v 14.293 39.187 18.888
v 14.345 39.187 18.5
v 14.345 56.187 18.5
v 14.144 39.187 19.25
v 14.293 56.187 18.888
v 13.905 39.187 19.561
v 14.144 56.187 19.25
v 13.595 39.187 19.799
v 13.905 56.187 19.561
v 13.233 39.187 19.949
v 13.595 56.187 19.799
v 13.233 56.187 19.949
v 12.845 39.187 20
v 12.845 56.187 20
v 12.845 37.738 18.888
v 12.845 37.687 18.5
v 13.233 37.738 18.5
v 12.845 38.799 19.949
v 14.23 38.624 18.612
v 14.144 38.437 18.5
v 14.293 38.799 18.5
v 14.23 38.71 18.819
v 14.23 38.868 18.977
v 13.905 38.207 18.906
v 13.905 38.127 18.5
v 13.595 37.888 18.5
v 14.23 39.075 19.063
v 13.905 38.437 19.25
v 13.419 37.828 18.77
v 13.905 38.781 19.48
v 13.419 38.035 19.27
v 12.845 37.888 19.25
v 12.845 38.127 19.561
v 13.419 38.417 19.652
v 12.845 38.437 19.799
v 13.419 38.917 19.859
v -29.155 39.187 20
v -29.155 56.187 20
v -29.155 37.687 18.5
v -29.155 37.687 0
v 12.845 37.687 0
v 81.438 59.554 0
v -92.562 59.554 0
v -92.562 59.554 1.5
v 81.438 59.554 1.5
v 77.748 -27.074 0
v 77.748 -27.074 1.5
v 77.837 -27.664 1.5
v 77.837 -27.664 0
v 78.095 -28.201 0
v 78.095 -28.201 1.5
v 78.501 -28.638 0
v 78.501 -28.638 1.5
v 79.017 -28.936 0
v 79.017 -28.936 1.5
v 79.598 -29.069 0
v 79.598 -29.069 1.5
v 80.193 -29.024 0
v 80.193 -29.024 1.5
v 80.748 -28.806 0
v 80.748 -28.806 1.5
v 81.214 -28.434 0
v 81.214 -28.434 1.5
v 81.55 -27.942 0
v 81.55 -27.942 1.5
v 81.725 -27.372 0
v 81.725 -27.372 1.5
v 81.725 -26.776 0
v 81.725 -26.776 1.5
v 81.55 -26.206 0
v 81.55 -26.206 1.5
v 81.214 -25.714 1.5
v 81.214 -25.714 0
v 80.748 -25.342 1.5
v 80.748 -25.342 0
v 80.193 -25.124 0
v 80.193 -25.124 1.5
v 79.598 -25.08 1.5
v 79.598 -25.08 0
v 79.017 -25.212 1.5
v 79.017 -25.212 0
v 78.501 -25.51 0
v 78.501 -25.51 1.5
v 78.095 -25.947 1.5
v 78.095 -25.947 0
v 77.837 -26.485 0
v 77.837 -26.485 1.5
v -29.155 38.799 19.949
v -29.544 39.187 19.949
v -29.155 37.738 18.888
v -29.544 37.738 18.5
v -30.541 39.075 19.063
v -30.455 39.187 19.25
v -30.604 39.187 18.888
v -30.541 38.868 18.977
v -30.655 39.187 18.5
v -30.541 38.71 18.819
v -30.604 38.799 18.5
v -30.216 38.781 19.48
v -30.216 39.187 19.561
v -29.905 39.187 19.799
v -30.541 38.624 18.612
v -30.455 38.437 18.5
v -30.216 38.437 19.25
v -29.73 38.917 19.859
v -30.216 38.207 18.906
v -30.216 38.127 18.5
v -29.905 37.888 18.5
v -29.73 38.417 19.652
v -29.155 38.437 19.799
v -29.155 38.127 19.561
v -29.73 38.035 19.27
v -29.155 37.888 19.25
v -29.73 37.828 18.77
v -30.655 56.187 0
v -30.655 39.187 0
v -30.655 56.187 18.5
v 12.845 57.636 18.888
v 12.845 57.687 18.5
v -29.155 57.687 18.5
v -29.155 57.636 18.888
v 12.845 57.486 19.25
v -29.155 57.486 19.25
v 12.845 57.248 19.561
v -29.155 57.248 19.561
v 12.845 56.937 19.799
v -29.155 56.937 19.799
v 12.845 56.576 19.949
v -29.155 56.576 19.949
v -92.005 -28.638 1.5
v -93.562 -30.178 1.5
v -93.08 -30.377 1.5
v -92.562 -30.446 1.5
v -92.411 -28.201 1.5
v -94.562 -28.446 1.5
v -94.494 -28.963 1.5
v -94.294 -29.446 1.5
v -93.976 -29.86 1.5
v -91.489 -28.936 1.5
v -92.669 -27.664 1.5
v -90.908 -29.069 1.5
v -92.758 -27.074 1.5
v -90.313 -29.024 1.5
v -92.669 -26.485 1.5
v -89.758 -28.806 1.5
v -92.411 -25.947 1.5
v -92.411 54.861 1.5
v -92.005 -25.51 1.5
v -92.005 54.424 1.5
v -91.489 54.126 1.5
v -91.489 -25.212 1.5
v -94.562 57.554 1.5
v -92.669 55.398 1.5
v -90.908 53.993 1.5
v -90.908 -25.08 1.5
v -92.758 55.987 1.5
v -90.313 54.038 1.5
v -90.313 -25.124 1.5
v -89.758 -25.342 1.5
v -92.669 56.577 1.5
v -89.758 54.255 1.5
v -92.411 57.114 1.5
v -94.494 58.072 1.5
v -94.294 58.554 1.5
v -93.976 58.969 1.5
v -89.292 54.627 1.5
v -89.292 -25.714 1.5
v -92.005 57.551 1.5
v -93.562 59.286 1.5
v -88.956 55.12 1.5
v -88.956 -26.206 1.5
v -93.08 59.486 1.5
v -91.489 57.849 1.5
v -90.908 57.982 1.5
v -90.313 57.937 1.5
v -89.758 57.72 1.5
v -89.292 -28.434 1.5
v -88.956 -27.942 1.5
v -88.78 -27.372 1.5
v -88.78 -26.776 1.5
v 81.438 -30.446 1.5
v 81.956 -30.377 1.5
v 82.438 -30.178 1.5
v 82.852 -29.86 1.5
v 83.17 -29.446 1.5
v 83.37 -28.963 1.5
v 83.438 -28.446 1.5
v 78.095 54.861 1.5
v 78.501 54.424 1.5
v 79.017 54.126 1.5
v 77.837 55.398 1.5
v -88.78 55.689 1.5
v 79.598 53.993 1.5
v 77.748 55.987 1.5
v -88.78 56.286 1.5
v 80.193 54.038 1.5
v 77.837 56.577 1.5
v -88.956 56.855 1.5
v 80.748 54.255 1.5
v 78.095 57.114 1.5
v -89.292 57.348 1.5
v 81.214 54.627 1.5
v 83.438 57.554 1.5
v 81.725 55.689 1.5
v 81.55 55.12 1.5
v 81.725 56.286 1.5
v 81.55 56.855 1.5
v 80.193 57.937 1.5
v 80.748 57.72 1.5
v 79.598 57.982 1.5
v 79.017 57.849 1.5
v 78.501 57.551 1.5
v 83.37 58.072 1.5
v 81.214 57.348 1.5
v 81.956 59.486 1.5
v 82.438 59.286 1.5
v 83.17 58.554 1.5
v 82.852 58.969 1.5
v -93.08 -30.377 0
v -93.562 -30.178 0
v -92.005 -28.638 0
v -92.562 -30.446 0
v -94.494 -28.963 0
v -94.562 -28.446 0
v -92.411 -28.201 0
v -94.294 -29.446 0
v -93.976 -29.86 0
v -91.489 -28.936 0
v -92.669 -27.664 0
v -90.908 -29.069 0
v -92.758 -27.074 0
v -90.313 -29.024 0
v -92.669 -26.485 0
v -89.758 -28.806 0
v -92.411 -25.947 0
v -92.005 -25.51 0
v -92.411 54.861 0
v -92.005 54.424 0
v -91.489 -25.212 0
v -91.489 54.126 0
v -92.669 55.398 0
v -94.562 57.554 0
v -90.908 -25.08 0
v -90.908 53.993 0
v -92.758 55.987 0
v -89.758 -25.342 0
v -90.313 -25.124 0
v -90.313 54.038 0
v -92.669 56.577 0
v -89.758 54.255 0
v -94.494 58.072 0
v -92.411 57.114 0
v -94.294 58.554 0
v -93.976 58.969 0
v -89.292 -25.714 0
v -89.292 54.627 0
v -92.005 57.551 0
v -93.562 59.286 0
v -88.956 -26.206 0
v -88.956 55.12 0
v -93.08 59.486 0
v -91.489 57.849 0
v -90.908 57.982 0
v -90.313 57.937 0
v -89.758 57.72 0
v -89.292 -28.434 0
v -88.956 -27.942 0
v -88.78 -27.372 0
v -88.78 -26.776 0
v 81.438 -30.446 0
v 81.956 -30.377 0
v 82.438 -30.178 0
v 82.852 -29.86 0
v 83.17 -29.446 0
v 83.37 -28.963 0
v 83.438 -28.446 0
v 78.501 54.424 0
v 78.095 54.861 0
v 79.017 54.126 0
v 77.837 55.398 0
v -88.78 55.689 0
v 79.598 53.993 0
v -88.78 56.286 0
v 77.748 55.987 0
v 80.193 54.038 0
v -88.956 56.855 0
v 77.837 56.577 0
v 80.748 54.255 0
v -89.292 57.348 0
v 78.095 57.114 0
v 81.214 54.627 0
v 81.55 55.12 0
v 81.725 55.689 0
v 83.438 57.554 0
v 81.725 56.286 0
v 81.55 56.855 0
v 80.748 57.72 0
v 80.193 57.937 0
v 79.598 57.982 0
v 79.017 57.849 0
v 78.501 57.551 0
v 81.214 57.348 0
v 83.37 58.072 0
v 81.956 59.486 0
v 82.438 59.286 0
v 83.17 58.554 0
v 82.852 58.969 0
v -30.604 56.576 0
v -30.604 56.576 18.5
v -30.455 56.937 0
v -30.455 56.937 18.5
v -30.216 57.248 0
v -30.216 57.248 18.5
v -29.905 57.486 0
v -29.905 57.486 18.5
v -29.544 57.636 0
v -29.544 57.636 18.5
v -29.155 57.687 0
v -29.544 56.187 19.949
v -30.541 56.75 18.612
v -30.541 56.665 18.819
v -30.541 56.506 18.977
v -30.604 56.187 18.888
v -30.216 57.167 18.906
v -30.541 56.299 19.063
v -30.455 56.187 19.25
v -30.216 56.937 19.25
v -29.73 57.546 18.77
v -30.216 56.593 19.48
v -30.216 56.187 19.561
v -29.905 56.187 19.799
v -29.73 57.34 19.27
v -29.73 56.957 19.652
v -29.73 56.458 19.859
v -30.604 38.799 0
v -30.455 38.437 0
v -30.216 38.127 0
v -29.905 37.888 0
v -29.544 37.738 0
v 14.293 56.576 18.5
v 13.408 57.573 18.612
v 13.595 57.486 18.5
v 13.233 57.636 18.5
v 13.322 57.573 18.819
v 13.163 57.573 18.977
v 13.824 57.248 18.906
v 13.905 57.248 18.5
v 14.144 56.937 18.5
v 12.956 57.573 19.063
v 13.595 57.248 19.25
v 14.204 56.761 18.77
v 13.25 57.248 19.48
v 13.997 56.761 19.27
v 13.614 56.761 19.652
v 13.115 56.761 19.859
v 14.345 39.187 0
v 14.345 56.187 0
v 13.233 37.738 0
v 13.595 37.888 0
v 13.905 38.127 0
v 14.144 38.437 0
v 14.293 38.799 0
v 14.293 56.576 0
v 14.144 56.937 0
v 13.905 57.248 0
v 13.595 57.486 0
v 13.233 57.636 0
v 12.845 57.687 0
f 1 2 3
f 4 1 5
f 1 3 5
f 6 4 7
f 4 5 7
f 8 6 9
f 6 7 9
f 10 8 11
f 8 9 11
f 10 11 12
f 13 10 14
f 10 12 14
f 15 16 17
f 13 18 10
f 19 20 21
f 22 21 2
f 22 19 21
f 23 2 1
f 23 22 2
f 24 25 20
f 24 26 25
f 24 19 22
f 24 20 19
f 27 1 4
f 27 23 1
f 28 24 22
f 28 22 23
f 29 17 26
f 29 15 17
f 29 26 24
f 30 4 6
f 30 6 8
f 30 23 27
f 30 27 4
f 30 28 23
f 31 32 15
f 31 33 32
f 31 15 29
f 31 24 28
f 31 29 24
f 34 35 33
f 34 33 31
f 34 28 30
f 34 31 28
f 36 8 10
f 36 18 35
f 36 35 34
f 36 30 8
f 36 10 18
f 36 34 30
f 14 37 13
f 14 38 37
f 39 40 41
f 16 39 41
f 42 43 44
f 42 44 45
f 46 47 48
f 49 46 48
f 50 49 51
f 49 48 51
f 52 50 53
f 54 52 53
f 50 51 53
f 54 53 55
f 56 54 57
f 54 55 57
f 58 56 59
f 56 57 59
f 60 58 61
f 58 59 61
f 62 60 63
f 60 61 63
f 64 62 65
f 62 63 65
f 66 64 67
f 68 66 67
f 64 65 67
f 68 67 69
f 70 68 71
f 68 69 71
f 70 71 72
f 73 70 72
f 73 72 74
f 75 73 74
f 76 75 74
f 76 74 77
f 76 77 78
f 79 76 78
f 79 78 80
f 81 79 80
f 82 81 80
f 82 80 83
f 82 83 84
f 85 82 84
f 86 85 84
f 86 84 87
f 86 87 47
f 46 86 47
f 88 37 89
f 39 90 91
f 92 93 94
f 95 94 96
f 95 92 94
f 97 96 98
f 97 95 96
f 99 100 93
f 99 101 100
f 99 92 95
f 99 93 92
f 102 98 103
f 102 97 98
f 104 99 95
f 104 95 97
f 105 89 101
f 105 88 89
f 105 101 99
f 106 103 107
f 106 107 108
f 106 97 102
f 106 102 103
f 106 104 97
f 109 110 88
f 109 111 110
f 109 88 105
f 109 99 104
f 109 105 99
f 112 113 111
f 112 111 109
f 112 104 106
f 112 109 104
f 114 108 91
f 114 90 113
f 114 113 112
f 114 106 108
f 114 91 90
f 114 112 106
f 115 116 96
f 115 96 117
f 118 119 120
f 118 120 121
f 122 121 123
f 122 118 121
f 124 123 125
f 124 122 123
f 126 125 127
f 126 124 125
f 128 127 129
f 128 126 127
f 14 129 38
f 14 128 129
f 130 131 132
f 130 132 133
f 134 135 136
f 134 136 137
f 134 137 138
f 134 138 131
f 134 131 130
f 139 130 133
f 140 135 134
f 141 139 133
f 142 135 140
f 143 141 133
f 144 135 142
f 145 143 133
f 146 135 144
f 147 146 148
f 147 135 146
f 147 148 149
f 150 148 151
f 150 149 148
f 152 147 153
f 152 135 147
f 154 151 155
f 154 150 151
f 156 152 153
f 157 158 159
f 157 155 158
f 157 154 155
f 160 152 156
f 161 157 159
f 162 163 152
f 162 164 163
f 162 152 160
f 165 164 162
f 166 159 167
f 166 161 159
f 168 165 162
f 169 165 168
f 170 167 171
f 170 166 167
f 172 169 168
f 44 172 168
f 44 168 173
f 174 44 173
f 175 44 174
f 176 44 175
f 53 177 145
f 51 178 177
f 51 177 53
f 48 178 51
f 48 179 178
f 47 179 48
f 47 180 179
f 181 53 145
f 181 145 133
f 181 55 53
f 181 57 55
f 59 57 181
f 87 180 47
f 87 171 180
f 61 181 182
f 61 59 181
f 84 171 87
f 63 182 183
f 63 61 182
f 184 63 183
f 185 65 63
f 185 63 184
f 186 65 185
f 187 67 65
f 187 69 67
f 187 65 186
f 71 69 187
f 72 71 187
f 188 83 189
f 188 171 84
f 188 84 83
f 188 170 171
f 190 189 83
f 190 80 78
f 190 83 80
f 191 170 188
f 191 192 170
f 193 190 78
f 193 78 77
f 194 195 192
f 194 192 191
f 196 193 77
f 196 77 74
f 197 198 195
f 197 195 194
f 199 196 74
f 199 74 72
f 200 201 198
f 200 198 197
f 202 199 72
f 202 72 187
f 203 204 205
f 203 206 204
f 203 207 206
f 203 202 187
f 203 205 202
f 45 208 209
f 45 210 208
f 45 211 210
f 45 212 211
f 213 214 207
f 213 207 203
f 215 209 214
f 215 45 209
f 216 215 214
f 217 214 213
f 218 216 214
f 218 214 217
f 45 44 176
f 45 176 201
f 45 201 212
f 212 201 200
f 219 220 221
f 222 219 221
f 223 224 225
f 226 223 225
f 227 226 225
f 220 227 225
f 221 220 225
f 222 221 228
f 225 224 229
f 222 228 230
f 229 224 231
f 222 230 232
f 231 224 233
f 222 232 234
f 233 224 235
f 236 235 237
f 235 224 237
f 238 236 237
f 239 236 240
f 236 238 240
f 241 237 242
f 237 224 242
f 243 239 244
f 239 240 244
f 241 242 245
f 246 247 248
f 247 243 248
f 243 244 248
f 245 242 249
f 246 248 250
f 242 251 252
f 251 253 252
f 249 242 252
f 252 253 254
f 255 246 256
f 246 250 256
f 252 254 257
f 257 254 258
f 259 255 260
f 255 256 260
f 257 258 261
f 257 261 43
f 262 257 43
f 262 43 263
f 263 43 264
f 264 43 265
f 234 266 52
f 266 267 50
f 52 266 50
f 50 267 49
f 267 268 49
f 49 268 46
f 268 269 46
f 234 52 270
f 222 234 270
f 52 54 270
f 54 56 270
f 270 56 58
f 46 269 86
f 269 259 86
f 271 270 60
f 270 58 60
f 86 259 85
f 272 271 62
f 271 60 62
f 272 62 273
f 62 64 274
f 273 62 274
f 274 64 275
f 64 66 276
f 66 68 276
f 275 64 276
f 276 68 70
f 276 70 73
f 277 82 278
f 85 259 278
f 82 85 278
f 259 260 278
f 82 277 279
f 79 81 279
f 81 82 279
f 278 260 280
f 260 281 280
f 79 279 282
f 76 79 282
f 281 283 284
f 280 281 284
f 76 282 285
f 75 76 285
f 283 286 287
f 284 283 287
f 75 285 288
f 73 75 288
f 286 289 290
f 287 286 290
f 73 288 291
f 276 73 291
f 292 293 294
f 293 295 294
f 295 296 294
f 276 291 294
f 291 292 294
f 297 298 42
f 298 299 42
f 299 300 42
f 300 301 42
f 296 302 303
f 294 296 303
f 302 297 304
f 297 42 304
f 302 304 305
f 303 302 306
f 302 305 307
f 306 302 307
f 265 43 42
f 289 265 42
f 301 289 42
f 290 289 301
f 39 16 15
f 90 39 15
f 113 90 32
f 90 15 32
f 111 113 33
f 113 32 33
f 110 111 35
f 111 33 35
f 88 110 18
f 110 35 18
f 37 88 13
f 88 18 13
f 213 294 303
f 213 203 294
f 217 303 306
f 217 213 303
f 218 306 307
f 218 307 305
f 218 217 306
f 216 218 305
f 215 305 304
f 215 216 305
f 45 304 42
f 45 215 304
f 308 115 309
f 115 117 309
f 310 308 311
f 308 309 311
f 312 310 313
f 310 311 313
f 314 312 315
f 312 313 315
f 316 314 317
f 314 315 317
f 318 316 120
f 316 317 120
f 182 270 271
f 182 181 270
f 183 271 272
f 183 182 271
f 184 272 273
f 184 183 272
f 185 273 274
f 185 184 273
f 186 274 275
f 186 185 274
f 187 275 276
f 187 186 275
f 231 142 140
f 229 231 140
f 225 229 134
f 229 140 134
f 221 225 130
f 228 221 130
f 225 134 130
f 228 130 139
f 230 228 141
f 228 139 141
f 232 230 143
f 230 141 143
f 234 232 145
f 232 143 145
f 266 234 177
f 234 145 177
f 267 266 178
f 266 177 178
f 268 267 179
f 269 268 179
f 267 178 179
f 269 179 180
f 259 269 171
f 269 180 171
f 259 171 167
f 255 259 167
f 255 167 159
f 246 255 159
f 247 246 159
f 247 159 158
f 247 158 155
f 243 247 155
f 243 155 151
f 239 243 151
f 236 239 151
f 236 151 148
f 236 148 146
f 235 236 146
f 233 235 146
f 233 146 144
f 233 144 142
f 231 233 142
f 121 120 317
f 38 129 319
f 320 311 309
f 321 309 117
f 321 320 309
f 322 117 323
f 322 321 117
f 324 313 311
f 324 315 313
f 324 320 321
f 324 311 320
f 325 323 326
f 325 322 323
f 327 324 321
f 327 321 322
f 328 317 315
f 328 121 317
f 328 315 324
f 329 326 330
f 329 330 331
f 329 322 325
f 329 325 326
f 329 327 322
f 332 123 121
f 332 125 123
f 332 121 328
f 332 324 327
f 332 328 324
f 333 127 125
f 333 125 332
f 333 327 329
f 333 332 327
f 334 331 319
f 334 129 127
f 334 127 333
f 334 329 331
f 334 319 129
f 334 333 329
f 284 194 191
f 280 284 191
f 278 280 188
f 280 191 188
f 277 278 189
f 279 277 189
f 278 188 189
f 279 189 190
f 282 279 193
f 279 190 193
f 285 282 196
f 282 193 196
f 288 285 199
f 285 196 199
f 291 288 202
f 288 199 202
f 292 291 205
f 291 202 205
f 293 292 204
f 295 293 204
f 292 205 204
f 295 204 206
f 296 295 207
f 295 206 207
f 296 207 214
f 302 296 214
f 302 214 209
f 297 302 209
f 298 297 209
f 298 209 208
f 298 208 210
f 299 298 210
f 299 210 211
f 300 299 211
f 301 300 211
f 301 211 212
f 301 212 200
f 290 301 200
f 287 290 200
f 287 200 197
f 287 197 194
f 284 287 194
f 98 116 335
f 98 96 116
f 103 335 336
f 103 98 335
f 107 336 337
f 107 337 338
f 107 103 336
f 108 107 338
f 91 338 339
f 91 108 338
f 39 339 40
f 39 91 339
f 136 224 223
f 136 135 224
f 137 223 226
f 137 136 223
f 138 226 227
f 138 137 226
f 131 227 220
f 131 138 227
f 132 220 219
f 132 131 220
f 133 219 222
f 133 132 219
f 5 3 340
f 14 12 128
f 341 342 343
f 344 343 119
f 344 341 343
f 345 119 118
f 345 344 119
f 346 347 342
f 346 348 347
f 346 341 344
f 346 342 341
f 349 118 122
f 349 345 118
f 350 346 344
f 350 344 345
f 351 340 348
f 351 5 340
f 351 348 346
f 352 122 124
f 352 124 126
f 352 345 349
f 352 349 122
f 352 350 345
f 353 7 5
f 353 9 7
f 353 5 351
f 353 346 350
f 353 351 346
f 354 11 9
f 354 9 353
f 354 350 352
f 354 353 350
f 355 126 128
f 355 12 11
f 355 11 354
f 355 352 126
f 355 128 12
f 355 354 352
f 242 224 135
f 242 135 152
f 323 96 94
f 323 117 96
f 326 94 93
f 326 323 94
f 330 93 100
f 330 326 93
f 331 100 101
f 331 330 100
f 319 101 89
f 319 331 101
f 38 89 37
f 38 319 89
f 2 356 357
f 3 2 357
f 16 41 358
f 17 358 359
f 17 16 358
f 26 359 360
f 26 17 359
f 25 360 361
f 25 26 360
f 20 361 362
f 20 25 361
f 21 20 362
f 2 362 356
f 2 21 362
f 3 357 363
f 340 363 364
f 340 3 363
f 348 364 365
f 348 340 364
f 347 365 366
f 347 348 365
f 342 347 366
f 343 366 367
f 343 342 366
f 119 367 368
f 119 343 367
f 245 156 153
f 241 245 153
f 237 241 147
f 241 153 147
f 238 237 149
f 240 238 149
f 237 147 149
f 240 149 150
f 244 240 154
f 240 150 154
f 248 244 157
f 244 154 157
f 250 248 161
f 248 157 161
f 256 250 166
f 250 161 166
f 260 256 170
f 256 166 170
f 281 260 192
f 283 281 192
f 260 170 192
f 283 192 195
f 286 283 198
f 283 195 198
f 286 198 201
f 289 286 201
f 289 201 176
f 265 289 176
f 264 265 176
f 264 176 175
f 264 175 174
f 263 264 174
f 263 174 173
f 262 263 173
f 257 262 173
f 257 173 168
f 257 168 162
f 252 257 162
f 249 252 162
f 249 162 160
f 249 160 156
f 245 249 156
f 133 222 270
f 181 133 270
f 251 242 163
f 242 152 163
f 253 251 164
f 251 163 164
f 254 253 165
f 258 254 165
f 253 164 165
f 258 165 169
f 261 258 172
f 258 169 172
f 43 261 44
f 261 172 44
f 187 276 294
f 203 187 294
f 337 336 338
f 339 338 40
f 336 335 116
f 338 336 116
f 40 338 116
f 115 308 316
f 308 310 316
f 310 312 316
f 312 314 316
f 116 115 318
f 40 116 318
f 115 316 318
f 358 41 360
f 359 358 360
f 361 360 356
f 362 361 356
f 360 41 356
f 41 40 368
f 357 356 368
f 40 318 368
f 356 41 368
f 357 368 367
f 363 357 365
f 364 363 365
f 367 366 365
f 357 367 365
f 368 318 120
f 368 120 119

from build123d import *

# Parameters (mm, degrees)
F0_W     = 178
F0_H     = 90
F1_DEPTH = 1.5
F2_R     = 2
F4_D     = 4
F4_DEPTH = 1.8
F4_TIP   = 1.2017212381
F3_W     = 45
F3_H     = 20
F5_DEPTH = 20
F6_R     = 1.5


with BuildPart() as f1:
    # F0 (on Top) → F1 (new body)
    with BuildSketch(Plane.XY):
        with Locations((-5.5619984269, 14.5544354618)):
            Rectangle(F0_W, F0_H)
    extrude(amount=F1_DEPTH)

    # F2
    f2_edges = [f1.edges().sort_by_distance(p)[0] for p in [
        (83.438002, 59.554435, 0.75),
        (83.438002, -30.445565, 0.75),
        (-94.561998, -30.445565, 0.75),
        (-94.561998, 59.554435, 0.75),
    ]]
    fillet(f2_edges, radius=F2_R)

    # F4
    with Locations(Plane(origin=(0, 0, 0), x_dir=(1, 0, 0), z_dir=(0, 0, -1))):
        with Locations((-90.7581523061, -55.987469852), (-90.7581523061, 27.0741246641), (79.7476842999, 27.0741246641), (79.7476842999, -55.987469852)):
            Hole(F4_D / 2, depth=F4_DEPTH)
            with Locations((0, 0, -(F4_DEPTH + F4_TIP / 2))):  # 118° drill point
                Cone(0, F4_D / 2, F4_TIP, mode=Mode.SUBTRACT)


with BuildPart() as f5:
    # F3 (on Top) → F5 (new body)
    with BuildSketch(Plane.XY):
        with Locations((-8.1554918271, 47.6872867346)):
            Rectangle(F3_W, F3_H)
    extrude(amount=F5_DEPTH)

    # F6
    f6_edges = [f5.edges().sort_by_distance(p)[0] for p in [
        (-8.155492, 37.687287, 20),
        (14.344508, 37.687287, 10),
        (14.344508, 47.687287, 20),
        (14.344508, 57.687287, 10),
        (-8.155492, 57.687287, 20),
        (-30.655492, 57.687287, 10),
        (-30.655492, 47.687287, 20),
        (-30.655492, 37.687287, 10),
    ]]
    fillet(f6_edges, radius=F6_R)


solid = Compound([f1.part, f5.part])
